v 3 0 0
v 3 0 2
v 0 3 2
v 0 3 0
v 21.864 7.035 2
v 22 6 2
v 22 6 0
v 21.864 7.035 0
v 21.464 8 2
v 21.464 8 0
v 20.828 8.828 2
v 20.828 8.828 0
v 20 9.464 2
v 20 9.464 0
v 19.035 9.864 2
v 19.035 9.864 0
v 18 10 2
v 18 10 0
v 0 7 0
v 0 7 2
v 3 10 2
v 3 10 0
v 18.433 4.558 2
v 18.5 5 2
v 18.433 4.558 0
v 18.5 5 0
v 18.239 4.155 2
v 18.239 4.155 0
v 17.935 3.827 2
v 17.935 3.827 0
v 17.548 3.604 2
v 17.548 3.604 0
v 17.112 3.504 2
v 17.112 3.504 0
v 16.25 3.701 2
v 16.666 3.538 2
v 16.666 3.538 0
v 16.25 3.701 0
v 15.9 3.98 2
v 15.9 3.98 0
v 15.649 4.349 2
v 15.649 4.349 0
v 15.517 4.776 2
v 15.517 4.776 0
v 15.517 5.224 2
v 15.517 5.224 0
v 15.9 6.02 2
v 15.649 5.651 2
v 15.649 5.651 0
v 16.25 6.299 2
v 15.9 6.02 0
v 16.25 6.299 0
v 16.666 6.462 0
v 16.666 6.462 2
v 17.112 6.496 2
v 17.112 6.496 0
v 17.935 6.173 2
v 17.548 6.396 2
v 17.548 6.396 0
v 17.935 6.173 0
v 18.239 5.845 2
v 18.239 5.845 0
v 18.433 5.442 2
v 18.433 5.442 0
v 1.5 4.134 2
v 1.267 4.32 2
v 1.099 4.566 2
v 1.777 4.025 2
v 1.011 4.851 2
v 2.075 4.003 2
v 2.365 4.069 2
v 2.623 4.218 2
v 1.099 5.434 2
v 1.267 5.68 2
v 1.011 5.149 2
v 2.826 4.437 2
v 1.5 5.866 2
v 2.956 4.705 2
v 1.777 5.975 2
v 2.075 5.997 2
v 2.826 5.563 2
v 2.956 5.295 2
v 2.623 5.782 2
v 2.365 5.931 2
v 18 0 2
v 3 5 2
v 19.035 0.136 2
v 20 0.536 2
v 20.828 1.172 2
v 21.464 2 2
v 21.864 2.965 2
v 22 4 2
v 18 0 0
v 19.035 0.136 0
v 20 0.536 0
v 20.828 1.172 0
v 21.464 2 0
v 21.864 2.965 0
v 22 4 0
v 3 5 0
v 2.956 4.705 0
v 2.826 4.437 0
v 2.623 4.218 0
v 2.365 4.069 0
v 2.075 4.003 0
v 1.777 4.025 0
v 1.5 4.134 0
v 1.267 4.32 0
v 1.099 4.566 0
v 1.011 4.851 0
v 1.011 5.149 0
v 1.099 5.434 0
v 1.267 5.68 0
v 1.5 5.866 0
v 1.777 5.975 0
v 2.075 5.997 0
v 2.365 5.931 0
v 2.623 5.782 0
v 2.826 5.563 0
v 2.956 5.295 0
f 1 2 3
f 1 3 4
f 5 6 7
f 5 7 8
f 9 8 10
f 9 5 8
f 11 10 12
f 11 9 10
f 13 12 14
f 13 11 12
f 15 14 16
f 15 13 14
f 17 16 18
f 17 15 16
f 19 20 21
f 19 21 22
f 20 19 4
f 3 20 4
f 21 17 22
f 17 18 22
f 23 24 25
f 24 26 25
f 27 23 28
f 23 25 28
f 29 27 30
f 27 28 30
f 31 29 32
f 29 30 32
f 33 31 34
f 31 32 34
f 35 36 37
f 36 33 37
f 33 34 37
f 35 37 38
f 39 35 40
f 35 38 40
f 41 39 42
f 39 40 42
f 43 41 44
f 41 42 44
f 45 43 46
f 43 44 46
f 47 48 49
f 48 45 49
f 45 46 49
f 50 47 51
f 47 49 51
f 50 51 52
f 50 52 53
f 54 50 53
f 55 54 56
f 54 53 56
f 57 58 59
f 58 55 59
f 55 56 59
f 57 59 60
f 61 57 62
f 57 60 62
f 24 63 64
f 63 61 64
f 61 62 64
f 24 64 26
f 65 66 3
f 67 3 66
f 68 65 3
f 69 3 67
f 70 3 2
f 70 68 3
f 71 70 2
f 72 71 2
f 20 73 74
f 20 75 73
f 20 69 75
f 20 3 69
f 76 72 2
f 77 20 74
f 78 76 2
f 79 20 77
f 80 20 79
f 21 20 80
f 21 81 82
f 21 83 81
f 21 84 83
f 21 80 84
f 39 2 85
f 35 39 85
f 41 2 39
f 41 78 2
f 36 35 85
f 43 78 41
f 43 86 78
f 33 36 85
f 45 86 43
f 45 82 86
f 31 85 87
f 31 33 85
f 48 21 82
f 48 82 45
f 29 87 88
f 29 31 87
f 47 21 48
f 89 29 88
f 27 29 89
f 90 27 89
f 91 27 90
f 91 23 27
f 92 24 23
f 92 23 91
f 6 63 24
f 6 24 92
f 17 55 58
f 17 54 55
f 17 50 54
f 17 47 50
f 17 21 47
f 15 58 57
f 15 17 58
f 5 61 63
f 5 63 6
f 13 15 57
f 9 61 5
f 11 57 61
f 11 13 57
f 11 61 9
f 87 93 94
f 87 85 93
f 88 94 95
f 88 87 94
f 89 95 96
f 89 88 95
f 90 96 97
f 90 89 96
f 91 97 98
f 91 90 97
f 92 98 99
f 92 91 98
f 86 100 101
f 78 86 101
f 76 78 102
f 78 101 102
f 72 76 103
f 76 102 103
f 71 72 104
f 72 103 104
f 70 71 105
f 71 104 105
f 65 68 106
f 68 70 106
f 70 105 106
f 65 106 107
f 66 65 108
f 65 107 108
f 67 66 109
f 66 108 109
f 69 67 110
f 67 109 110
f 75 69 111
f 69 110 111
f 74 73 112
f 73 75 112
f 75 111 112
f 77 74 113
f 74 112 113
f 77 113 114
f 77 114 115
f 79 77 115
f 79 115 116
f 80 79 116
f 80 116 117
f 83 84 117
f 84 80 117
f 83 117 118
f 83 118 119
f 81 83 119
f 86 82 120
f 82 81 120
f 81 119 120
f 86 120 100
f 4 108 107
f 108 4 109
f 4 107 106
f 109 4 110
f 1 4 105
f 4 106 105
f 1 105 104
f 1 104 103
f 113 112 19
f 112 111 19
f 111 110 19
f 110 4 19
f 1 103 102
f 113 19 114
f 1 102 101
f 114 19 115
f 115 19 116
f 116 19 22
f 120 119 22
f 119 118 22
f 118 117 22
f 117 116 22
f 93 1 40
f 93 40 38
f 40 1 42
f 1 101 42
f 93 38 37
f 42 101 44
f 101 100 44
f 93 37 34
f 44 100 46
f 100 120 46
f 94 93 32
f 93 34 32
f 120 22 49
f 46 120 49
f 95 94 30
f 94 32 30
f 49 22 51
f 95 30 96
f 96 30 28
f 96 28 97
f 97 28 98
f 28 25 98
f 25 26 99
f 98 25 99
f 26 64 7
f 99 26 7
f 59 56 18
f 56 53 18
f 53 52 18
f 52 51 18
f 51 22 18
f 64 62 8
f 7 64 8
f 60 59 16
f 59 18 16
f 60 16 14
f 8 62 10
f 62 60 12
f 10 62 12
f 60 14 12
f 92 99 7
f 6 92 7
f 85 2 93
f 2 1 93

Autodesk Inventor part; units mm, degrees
ref_plane "YZ Plane" through (0, 0, 0) normal (1, 0, 0) x (0, 1, 0)
ref_plane "XZ Plane" through (0, 0, 0) normal (0, 1, 0) x (-1, 0, 0)
ref_plane "XY Plane" through (0, 0, 0) normal (0, 0, 1) x (1, 0, 0)
sketch "Sketch1" plane through (0, 0, 0) normal (0, 0, 1) x (1, 0, 0)
  line L0 (0, 0) -> (22, 0)
  line L1 (22, 0) -> (22, 10)
  line L2 (22, 10) -> (0, 10)
  line L3 (0, 10) -> (0, 0)
  circle A0 centre (17, 5) radius 1.5
  circle A1 centre (2, 5) radius 1
  point P0 (22, 5)
  dimension "d0" = 22
  dimension "d1" = 10
  dimension "d2" = 3
  dimension "d3" = 2
  dimension "d4" = 15
  dimension "d5" = 5
extrude "Extrusion1" add sketch "Sketch1" along normal blind 2
fillet "Fillet1" radius 4 2 edges at (22, 10, 1) (22, 0, 1)
chamfer "Chamfer1" distance 3 angle 45 2 edges at (0, 10, 1) (0, 0, 1)
properties part number "servo arm"
